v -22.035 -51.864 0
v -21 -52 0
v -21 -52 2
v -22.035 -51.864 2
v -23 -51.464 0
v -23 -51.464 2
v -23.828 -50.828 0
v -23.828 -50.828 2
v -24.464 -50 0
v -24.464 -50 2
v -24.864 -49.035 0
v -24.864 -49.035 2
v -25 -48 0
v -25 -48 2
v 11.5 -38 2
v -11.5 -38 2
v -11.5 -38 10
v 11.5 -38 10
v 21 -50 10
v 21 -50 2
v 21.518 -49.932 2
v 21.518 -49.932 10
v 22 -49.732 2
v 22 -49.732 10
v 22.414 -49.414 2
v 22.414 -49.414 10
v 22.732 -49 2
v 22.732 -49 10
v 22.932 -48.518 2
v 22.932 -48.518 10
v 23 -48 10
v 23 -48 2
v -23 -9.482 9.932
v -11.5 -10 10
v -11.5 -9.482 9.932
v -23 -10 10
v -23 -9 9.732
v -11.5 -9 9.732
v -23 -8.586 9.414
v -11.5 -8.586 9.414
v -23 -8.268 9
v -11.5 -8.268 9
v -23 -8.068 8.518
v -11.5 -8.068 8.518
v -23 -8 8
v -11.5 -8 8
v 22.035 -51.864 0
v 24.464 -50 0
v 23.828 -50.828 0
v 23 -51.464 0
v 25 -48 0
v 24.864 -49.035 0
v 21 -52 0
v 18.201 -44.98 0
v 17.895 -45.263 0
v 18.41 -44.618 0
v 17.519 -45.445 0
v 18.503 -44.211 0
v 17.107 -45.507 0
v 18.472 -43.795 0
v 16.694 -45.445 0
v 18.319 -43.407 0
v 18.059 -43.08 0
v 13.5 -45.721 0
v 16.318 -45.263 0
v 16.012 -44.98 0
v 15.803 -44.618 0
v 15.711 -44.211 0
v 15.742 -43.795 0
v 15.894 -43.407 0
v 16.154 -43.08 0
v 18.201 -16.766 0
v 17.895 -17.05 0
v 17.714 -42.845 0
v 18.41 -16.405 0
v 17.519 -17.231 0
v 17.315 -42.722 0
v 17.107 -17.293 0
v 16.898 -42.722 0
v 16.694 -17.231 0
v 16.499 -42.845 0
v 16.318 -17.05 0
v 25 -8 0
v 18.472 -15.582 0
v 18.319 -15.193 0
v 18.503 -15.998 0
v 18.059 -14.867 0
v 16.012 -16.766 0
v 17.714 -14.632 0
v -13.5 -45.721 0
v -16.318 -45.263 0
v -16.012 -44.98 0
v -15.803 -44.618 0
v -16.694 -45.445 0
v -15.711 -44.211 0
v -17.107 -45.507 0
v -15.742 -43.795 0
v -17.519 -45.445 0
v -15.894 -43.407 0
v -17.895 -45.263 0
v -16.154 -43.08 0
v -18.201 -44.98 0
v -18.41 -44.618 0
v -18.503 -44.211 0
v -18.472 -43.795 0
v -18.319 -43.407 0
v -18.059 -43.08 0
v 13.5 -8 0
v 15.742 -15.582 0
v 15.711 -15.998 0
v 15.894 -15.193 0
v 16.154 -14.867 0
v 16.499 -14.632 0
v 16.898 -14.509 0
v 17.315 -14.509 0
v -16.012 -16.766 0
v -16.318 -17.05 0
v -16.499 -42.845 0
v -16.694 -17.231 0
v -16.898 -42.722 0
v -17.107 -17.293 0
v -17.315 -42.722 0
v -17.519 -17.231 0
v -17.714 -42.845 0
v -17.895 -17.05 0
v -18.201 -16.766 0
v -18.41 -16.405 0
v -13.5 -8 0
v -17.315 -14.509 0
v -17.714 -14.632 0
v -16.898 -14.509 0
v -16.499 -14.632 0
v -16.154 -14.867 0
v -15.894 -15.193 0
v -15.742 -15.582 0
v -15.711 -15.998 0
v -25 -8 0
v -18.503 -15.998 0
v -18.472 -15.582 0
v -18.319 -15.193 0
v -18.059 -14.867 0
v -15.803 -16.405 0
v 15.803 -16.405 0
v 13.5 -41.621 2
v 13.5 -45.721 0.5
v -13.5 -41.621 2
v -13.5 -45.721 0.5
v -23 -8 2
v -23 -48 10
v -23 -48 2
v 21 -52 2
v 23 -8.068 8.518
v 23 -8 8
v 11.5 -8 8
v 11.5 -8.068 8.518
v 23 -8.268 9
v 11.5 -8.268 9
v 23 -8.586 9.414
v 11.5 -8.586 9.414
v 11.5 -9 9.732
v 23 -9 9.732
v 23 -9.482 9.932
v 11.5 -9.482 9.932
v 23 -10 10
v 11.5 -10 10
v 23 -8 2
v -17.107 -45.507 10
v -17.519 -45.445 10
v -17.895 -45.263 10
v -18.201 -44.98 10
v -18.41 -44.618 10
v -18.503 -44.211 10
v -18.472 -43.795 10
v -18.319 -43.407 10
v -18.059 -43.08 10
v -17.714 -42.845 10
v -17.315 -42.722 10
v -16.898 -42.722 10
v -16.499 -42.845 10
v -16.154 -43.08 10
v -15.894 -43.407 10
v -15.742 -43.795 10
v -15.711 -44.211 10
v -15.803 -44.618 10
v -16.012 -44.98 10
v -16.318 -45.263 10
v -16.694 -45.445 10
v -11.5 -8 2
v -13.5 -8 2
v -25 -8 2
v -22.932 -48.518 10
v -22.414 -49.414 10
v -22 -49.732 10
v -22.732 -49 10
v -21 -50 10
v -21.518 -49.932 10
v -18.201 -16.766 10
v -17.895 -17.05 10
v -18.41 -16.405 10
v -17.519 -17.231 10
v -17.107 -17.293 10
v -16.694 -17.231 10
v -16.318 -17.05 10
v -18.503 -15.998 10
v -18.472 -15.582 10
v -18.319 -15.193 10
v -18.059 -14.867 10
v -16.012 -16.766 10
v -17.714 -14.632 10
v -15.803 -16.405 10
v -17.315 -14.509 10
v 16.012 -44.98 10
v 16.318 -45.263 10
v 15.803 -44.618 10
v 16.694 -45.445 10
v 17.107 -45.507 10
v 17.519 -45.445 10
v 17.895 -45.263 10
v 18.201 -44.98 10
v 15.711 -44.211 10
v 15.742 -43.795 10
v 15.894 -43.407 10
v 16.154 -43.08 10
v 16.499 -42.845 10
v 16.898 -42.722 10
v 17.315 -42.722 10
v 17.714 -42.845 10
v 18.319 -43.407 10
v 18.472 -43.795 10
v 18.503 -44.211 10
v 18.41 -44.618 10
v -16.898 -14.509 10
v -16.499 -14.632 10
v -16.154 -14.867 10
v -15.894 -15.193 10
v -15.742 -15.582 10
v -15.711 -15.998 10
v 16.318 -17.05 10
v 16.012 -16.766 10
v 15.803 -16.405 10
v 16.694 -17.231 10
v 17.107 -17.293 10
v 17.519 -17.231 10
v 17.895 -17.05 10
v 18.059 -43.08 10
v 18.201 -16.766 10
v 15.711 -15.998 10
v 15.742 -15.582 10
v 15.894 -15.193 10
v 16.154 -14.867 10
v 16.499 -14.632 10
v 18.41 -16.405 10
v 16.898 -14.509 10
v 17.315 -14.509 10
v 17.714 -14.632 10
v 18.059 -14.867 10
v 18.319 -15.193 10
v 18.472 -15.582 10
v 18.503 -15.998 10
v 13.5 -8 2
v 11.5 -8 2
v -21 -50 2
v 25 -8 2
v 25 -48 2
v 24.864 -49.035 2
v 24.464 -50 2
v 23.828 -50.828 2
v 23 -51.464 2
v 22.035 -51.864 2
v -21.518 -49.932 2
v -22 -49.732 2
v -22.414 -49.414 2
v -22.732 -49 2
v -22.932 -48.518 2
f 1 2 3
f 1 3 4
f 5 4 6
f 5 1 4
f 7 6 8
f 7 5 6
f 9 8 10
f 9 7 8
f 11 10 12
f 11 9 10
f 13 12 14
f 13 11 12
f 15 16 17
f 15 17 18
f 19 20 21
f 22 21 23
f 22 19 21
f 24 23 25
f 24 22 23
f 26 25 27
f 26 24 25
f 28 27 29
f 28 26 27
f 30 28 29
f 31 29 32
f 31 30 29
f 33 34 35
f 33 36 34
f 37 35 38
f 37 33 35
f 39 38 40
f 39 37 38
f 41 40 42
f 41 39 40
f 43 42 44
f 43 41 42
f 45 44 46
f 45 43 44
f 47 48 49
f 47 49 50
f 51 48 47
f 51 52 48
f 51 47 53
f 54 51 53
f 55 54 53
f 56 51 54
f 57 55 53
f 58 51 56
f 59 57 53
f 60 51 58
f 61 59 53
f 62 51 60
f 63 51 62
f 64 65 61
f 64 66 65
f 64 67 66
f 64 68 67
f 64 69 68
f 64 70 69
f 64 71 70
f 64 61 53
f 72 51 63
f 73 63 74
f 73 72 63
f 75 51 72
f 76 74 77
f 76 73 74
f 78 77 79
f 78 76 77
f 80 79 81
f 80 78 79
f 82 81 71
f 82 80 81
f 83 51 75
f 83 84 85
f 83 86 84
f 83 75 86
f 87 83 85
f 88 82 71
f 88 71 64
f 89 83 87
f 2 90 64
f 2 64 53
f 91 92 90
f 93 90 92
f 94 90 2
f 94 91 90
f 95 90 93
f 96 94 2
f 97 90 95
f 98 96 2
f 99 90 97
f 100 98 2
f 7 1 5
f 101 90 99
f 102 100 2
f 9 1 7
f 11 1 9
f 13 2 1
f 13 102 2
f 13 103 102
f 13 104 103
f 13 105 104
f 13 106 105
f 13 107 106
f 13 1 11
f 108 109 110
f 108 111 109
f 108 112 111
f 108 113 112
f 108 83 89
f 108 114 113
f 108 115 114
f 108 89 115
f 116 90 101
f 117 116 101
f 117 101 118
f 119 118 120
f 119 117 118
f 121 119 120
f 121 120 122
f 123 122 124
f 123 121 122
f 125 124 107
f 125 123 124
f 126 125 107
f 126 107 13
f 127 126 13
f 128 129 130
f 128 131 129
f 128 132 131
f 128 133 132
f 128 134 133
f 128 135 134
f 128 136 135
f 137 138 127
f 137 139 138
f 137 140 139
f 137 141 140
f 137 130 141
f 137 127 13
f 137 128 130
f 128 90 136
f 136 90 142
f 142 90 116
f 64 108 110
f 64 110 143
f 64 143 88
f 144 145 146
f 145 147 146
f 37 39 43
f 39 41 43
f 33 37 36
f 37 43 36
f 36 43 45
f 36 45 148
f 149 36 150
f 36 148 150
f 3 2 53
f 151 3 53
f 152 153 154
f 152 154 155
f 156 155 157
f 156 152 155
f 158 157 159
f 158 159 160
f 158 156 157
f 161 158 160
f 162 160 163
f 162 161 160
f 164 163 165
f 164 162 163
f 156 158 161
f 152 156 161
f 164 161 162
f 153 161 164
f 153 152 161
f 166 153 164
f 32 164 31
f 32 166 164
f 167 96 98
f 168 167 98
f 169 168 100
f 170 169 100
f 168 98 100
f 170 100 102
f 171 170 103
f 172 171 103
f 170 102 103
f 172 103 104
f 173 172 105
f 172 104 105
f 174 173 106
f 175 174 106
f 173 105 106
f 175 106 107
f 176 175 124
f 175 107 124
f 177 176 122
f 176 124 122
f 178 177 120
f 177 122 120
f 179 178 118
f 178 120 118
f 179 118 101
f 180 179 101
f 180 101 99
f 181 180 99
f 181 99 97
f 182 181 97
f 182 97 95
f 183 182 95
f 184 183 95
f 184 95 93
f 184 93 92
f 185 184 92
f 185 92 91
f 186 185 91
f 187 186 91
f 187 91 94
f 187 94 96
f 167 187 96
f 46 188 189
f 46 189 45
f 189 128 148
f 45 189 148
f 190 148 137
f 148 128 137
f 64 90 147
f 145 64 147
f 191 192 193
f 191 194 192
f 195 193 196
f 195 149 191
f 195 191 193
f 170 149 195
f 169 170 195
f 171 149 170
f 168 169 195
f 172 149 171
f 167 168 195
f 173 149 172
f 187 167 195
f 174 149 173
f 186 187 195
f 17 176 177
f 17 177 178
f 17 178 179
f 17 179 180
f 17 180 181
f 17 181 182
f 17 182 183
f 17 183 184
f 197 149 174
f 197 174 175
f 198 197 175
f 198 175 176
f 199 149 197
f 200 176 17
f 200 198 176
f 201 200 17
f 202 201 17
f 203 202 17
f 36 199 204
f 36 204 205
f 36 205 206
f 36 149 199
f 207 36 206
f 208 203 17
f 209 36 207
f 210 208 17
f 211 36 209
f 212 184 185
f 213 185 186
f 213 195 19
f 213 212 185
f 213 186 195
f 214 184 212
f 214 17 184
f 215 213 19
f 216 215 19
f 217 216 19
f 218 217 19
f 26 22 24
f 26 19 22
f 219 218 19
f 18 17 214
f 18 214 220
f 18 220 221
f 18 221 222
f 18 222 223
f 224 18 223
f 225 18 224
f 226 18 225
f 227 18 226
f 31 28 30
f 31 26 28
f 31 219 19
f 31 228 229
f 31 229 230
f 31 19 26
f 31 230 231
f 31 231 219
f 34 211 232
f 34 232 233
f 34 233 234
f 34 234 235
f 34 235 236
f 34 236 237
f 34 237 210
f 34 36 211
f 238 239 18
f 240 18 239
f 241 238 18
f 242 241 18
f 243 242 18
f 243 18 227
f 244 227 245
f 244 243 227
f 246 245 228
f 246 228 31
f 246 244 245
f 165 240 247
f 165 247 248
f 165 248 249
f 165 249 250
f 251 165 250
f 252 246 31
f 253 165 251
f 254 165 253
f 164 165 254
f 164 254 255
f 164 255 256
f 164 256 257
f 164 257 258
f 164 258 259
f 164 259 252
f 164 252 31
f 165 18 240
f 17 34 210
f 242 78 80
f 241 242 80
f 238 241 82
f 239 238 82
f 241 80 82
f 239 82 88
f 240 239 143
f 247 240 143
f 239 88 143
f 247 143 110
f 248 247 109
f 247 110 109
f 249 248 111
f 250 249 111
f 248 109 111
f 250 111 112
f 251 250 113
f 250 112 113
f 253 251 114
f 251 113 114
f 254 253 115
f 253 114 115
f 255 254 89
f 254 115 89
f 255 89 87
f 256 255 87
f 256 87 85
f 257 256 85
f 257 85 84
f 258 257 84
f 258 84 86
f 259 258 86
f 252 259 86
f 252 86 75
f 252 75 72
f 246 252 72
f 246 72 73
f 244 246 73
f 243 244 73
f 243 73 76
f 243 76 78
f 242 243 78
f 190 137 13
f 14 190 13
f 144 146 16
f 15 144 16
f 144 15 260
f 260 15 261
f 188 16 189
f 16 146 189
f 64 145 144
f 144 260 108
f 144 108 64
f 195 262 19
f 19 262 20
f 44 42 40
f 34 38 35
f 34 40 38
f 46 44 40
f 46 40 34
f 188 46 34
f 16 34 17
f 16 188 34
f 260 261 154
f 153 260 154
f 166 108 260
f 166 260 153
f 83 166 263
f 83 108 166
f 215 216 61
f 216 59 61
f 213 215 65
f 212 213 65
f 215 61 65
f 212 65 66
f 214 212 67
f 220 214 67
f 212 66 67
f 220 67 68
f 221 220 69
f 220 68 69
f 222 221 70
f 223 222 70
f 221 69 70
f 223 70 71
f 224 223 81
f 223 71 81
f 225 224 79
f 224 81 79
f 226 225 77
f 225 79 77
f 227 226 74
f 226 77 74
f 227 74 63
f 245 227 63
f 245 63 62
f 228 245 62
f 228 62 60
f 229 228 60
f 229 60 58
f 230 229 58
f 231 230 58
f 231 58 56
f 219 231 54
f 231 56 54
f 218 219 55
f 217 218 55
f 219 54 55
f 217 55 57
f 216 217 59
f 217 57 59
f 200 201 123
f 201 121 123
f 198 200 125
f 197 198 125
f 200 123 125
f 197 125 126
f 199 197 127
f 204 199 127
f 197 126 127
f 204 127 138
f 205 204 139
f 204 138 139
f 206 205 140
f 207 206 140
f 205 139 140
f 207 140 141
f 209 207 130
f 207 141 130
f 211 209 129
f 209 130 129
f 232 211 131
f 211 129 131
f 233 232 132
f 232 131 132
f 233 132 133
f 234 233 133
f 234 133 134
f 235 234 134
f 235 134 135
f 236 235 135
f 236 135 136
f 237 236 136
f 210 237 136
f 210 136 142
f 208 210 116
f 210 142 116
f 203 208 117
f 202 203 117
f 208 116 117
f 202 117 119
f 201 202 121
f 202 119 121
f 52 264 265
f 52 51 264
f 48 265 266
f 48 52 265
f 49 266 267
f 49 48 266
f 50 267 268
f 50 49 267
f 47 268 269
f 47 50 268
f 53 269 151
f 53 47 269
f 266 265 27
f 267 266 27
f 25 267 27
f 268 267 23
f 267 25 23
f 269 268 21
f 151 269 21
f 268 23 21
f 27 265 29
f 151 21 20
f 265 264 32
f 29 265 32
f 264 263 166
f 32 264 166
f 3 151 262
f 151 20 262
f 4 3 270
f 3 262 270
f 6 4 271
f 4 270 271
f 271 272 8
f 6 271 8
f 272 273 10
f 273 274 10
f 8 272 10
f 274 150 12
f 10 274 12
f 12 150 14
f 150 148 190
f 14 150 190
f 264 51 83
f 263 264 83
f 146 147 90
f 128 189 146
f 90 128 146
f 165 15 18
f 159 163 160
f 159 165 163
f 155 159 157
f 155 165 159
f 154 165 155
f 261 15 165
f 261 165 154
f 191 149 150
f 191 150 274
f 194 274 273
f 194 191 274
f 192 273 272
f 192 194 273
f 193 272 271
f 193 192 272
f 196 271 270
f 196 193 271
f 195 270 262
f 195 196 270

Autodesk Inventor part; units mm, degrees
ref_plane "YZ Plane" through (0, 0, 0) normal (1, 0, 0) x (0, 1, 0)
ref_plane "XZ Plane" through (0, 0, 0) normal (0, 1, 0) x (-1, 0, 0)
ref_plane "XY Plane" through (0, 0, 0) normal (0, 0, 1) x (1, 0, 0)
sketch "Skizze1" plane through (0, 0, 0) normal (0, 0, 1) x (1, 0, 0)
  line L0 (11.5, 38) -> (-11.5, 38)
  line L1 (-11.5, 38) -> (-11.5, -38)
  line L2 (-11.5, -38) -> (11.5, -38)
  line L3 (11.5, -38) -> (11.5, 38)
  line L4 (11.5, 38) -> (-11.5, -38) construction
  line L5 (-11.5, 38) -> (11.5, -38) construction
  line L6 (-23, -50) -> (23, -50)
  line L7 (23, -50) -> (23, -38)
  line L8 (23, -38) -> (-23, -38)
  line L9 (-23, -38) -> (-23, -50)
  line L10 (-23, -50) -> (23, -38) construction
  line L11 (23, -50) -> (-23, -38) construction
  line L12 (-23, -38) -> (-11.5, -38)
  line L13 (-11.5, -38) -> (-11.5, -8)
  line L14 (-11.5, -8) -> (-23, -8)
  line L15 (-23, -8) -> (-23, -38)
  line L16 (23, -38) -> (11.5, -38)
  line L17 (11.5, -38) -> (11.5, -8)
  line L18 (11.5, -8) -> (23, -8)
  line L19 (23, -8) -> (23, -38)
  point P0 (0, 0)
  point P1 (0, -44)
  point P2 (0, -38)
  dimension "d0" = 23
  dimension "d1" = 76
  dimension "d2" = 12
  dimension "d3" = 30
  dimension "d4" = 30
  dimension "d5" = 46
extrude "Extrusion1" add sketch "Skizze1" along normal blind 10 contours L18 L19 L8 L3 | L1 L8 L15 L14 | L8 L7 L6 L9 L2
sketch "Skizze2" plane through (-11.5, -38, 0) normal (1, 0, 0) x (0, 0, -1)
  line L0 (0, 30) -> (0, -12) projected
  line L1 (0, -7.7211) -> (-0.5, -7.7211)
  line L2 (-0.5, -7.7211) -> (-2, -3.621)
  line L3 (-2, -3.621) -> (-2, 30)
  line L4 (-2, 30) -> (0, 30)
  line L5 (0, 0) -> (0, 30) projected
  point P0 (0, 38)
  point P1 (0, 5.0638)
  dimension "d8" = 0.5
  dimension "d15" = 2
extrude "Extrusion2" cut sketch "Skizze2" along normal blind 25 and the other way blind 2
sketch "Skizze3" plane through (-23, -50, 0) normal (-1, 0, 0) x (0, 0, 1)
  line L0 (0, 42) -> (0, 0) projected
  line L1 (0, 0) -> (10, 0) projected
  line L2 (10, 42) -> (10, 0) projected
  line L3 (0, 42) -> (10, 42) projected
  circle A0 centre (6.7241, 56.1881) radius 1.5
  point P0 (0, 50)
  dimension "d11" = 3
extrude "Extrusion3" cut sketch "Skizze3" against normal through all contours A0
fillet "Rundung1" radius 2 4 edges at (17.25, -8, 10) (-17.25, -8, 10) (-23, -50, 5) (23, -50, 5)
sketch "Skizze4" plane through (0, 0, 0) normal (0, 0, -1) x (-1, 0, 0)
  arc A0 (-23, -48) -> (-21, -50) centre (-21, -48) ccw projected
  line L0 (21, -50) -> (-21, -50) projected
  arc A1 (21, -50) -> (23, -48) centre (21, -48) ccw projected
  line L1 (23, -8) -> (23, -48) projected
  line L2 (13.5, -8) -> (23, -8) projected
  line L3 (13.5, -8) -> (13.5, -45.7211) projected
  line L4 (13.5, -45.7211) -> (-13.5, -45.7211) projected
  line L5 (-13.5, -45.7211) -> (-13.5, -8) projected
  line L6 (-23, -8) -> (-13.5, -8) projected
  line L7 (-23, -48) -> (-23, -8) projected
  line L8 (-25, -6) -> (-11.5, -6)
  line L9 (-11.5, -6) -> (-11.5, -43.7211)
  line L10 (-11.5, -43.7211) -> (11.5, -43.7211)
  line L11 (11.5, -43.7211) -> (11.5, -6)
  line L12 (11.5, -6) -> (25, -6)
  line L13 (25, -6) -> (25, -48)
  arc A2 (21, -52) -> (25, -48) centre (21, -48) ccw
  line L14 (21, -52) -> (-21, -52)
  arc A3 (-25, -48) -> (-21, -52) centre (-21, -48) ccw
  line L15 (-25, -48) -> (-25, -6)
  line L16 (-23, -8) -> (-25, -8)
  line L17 (23, -8) -> (25, -8)
  point P0 (0, 0)
  dimension "d18" = 2
extrude "Extrusion4" add sketch "Skizze4" against normal blind 2 contours A0 L0 A1 L1 L17 L13 A2 L14 A3 L15 L16 L7
sketch "Skizze5" plane through (0, 0, 10) normal (0, 0, 1) x (1, 0, 0)
  arc A0 (21, -50) -> (23, -48) centre (21, -48) ccw projected
  line L0 (23, -48) -> (23, -10) projected
  line L1 (11.5, -10) -> (23, -10) projected
  line L2 (11.5, -10) -> (11.5, -38) projected
  line L3 (11.5, -38) -> (-11.5, -38) projected
  line L4 (-11.5, -38) -> (-11.5, -10) projected
  line L5 (-23, -10) -> (-11.5, -10) projected
  line L6 (-23, -10) -> (-23, -48) projected
  arc A1 (-23, -48) -> (-21, -50) centre (-21, -48) ccw projected
  line L7 (-21, -50) -> (21, -50) projected
  line L8 (-17.1067, -44.1067) -> (-17.1067, -15.8933)
  line L9 (-17.1067, -15.8933) -> (-17.3933, -15.8933)
  line L10 (-17.3933, -15.8933) -> (-17.3933, -43.8933)
  line L11 (-17.3933, -43.8933) -> (17.3933, -43.8933)
  line L12 (17.3933, -43.8933) -> (17.3933, -15.8933)
  line L13 (17.3933, -15.8933) -> (17.1067, -15.8933)
  line L14 (17.1067, -15.8933) -> (17.1067, -44.1067)
  line L15 (17.1067, -44.1067) -> (-17.1067, -44.1067)
  point P0 (0, 0)
hole "Bohrung1" at (-17.1067, -44.1067, 10) at (17.1067, -44.1067, 10) at (17.1067, -15.8933, 10) at (-17.1067, -15.8933, 10) direction (0, 0, -1) diameter 2.8 depth 12 tip angle 118
properties part number "Anglerfish_coverslipclamp_top_short"
